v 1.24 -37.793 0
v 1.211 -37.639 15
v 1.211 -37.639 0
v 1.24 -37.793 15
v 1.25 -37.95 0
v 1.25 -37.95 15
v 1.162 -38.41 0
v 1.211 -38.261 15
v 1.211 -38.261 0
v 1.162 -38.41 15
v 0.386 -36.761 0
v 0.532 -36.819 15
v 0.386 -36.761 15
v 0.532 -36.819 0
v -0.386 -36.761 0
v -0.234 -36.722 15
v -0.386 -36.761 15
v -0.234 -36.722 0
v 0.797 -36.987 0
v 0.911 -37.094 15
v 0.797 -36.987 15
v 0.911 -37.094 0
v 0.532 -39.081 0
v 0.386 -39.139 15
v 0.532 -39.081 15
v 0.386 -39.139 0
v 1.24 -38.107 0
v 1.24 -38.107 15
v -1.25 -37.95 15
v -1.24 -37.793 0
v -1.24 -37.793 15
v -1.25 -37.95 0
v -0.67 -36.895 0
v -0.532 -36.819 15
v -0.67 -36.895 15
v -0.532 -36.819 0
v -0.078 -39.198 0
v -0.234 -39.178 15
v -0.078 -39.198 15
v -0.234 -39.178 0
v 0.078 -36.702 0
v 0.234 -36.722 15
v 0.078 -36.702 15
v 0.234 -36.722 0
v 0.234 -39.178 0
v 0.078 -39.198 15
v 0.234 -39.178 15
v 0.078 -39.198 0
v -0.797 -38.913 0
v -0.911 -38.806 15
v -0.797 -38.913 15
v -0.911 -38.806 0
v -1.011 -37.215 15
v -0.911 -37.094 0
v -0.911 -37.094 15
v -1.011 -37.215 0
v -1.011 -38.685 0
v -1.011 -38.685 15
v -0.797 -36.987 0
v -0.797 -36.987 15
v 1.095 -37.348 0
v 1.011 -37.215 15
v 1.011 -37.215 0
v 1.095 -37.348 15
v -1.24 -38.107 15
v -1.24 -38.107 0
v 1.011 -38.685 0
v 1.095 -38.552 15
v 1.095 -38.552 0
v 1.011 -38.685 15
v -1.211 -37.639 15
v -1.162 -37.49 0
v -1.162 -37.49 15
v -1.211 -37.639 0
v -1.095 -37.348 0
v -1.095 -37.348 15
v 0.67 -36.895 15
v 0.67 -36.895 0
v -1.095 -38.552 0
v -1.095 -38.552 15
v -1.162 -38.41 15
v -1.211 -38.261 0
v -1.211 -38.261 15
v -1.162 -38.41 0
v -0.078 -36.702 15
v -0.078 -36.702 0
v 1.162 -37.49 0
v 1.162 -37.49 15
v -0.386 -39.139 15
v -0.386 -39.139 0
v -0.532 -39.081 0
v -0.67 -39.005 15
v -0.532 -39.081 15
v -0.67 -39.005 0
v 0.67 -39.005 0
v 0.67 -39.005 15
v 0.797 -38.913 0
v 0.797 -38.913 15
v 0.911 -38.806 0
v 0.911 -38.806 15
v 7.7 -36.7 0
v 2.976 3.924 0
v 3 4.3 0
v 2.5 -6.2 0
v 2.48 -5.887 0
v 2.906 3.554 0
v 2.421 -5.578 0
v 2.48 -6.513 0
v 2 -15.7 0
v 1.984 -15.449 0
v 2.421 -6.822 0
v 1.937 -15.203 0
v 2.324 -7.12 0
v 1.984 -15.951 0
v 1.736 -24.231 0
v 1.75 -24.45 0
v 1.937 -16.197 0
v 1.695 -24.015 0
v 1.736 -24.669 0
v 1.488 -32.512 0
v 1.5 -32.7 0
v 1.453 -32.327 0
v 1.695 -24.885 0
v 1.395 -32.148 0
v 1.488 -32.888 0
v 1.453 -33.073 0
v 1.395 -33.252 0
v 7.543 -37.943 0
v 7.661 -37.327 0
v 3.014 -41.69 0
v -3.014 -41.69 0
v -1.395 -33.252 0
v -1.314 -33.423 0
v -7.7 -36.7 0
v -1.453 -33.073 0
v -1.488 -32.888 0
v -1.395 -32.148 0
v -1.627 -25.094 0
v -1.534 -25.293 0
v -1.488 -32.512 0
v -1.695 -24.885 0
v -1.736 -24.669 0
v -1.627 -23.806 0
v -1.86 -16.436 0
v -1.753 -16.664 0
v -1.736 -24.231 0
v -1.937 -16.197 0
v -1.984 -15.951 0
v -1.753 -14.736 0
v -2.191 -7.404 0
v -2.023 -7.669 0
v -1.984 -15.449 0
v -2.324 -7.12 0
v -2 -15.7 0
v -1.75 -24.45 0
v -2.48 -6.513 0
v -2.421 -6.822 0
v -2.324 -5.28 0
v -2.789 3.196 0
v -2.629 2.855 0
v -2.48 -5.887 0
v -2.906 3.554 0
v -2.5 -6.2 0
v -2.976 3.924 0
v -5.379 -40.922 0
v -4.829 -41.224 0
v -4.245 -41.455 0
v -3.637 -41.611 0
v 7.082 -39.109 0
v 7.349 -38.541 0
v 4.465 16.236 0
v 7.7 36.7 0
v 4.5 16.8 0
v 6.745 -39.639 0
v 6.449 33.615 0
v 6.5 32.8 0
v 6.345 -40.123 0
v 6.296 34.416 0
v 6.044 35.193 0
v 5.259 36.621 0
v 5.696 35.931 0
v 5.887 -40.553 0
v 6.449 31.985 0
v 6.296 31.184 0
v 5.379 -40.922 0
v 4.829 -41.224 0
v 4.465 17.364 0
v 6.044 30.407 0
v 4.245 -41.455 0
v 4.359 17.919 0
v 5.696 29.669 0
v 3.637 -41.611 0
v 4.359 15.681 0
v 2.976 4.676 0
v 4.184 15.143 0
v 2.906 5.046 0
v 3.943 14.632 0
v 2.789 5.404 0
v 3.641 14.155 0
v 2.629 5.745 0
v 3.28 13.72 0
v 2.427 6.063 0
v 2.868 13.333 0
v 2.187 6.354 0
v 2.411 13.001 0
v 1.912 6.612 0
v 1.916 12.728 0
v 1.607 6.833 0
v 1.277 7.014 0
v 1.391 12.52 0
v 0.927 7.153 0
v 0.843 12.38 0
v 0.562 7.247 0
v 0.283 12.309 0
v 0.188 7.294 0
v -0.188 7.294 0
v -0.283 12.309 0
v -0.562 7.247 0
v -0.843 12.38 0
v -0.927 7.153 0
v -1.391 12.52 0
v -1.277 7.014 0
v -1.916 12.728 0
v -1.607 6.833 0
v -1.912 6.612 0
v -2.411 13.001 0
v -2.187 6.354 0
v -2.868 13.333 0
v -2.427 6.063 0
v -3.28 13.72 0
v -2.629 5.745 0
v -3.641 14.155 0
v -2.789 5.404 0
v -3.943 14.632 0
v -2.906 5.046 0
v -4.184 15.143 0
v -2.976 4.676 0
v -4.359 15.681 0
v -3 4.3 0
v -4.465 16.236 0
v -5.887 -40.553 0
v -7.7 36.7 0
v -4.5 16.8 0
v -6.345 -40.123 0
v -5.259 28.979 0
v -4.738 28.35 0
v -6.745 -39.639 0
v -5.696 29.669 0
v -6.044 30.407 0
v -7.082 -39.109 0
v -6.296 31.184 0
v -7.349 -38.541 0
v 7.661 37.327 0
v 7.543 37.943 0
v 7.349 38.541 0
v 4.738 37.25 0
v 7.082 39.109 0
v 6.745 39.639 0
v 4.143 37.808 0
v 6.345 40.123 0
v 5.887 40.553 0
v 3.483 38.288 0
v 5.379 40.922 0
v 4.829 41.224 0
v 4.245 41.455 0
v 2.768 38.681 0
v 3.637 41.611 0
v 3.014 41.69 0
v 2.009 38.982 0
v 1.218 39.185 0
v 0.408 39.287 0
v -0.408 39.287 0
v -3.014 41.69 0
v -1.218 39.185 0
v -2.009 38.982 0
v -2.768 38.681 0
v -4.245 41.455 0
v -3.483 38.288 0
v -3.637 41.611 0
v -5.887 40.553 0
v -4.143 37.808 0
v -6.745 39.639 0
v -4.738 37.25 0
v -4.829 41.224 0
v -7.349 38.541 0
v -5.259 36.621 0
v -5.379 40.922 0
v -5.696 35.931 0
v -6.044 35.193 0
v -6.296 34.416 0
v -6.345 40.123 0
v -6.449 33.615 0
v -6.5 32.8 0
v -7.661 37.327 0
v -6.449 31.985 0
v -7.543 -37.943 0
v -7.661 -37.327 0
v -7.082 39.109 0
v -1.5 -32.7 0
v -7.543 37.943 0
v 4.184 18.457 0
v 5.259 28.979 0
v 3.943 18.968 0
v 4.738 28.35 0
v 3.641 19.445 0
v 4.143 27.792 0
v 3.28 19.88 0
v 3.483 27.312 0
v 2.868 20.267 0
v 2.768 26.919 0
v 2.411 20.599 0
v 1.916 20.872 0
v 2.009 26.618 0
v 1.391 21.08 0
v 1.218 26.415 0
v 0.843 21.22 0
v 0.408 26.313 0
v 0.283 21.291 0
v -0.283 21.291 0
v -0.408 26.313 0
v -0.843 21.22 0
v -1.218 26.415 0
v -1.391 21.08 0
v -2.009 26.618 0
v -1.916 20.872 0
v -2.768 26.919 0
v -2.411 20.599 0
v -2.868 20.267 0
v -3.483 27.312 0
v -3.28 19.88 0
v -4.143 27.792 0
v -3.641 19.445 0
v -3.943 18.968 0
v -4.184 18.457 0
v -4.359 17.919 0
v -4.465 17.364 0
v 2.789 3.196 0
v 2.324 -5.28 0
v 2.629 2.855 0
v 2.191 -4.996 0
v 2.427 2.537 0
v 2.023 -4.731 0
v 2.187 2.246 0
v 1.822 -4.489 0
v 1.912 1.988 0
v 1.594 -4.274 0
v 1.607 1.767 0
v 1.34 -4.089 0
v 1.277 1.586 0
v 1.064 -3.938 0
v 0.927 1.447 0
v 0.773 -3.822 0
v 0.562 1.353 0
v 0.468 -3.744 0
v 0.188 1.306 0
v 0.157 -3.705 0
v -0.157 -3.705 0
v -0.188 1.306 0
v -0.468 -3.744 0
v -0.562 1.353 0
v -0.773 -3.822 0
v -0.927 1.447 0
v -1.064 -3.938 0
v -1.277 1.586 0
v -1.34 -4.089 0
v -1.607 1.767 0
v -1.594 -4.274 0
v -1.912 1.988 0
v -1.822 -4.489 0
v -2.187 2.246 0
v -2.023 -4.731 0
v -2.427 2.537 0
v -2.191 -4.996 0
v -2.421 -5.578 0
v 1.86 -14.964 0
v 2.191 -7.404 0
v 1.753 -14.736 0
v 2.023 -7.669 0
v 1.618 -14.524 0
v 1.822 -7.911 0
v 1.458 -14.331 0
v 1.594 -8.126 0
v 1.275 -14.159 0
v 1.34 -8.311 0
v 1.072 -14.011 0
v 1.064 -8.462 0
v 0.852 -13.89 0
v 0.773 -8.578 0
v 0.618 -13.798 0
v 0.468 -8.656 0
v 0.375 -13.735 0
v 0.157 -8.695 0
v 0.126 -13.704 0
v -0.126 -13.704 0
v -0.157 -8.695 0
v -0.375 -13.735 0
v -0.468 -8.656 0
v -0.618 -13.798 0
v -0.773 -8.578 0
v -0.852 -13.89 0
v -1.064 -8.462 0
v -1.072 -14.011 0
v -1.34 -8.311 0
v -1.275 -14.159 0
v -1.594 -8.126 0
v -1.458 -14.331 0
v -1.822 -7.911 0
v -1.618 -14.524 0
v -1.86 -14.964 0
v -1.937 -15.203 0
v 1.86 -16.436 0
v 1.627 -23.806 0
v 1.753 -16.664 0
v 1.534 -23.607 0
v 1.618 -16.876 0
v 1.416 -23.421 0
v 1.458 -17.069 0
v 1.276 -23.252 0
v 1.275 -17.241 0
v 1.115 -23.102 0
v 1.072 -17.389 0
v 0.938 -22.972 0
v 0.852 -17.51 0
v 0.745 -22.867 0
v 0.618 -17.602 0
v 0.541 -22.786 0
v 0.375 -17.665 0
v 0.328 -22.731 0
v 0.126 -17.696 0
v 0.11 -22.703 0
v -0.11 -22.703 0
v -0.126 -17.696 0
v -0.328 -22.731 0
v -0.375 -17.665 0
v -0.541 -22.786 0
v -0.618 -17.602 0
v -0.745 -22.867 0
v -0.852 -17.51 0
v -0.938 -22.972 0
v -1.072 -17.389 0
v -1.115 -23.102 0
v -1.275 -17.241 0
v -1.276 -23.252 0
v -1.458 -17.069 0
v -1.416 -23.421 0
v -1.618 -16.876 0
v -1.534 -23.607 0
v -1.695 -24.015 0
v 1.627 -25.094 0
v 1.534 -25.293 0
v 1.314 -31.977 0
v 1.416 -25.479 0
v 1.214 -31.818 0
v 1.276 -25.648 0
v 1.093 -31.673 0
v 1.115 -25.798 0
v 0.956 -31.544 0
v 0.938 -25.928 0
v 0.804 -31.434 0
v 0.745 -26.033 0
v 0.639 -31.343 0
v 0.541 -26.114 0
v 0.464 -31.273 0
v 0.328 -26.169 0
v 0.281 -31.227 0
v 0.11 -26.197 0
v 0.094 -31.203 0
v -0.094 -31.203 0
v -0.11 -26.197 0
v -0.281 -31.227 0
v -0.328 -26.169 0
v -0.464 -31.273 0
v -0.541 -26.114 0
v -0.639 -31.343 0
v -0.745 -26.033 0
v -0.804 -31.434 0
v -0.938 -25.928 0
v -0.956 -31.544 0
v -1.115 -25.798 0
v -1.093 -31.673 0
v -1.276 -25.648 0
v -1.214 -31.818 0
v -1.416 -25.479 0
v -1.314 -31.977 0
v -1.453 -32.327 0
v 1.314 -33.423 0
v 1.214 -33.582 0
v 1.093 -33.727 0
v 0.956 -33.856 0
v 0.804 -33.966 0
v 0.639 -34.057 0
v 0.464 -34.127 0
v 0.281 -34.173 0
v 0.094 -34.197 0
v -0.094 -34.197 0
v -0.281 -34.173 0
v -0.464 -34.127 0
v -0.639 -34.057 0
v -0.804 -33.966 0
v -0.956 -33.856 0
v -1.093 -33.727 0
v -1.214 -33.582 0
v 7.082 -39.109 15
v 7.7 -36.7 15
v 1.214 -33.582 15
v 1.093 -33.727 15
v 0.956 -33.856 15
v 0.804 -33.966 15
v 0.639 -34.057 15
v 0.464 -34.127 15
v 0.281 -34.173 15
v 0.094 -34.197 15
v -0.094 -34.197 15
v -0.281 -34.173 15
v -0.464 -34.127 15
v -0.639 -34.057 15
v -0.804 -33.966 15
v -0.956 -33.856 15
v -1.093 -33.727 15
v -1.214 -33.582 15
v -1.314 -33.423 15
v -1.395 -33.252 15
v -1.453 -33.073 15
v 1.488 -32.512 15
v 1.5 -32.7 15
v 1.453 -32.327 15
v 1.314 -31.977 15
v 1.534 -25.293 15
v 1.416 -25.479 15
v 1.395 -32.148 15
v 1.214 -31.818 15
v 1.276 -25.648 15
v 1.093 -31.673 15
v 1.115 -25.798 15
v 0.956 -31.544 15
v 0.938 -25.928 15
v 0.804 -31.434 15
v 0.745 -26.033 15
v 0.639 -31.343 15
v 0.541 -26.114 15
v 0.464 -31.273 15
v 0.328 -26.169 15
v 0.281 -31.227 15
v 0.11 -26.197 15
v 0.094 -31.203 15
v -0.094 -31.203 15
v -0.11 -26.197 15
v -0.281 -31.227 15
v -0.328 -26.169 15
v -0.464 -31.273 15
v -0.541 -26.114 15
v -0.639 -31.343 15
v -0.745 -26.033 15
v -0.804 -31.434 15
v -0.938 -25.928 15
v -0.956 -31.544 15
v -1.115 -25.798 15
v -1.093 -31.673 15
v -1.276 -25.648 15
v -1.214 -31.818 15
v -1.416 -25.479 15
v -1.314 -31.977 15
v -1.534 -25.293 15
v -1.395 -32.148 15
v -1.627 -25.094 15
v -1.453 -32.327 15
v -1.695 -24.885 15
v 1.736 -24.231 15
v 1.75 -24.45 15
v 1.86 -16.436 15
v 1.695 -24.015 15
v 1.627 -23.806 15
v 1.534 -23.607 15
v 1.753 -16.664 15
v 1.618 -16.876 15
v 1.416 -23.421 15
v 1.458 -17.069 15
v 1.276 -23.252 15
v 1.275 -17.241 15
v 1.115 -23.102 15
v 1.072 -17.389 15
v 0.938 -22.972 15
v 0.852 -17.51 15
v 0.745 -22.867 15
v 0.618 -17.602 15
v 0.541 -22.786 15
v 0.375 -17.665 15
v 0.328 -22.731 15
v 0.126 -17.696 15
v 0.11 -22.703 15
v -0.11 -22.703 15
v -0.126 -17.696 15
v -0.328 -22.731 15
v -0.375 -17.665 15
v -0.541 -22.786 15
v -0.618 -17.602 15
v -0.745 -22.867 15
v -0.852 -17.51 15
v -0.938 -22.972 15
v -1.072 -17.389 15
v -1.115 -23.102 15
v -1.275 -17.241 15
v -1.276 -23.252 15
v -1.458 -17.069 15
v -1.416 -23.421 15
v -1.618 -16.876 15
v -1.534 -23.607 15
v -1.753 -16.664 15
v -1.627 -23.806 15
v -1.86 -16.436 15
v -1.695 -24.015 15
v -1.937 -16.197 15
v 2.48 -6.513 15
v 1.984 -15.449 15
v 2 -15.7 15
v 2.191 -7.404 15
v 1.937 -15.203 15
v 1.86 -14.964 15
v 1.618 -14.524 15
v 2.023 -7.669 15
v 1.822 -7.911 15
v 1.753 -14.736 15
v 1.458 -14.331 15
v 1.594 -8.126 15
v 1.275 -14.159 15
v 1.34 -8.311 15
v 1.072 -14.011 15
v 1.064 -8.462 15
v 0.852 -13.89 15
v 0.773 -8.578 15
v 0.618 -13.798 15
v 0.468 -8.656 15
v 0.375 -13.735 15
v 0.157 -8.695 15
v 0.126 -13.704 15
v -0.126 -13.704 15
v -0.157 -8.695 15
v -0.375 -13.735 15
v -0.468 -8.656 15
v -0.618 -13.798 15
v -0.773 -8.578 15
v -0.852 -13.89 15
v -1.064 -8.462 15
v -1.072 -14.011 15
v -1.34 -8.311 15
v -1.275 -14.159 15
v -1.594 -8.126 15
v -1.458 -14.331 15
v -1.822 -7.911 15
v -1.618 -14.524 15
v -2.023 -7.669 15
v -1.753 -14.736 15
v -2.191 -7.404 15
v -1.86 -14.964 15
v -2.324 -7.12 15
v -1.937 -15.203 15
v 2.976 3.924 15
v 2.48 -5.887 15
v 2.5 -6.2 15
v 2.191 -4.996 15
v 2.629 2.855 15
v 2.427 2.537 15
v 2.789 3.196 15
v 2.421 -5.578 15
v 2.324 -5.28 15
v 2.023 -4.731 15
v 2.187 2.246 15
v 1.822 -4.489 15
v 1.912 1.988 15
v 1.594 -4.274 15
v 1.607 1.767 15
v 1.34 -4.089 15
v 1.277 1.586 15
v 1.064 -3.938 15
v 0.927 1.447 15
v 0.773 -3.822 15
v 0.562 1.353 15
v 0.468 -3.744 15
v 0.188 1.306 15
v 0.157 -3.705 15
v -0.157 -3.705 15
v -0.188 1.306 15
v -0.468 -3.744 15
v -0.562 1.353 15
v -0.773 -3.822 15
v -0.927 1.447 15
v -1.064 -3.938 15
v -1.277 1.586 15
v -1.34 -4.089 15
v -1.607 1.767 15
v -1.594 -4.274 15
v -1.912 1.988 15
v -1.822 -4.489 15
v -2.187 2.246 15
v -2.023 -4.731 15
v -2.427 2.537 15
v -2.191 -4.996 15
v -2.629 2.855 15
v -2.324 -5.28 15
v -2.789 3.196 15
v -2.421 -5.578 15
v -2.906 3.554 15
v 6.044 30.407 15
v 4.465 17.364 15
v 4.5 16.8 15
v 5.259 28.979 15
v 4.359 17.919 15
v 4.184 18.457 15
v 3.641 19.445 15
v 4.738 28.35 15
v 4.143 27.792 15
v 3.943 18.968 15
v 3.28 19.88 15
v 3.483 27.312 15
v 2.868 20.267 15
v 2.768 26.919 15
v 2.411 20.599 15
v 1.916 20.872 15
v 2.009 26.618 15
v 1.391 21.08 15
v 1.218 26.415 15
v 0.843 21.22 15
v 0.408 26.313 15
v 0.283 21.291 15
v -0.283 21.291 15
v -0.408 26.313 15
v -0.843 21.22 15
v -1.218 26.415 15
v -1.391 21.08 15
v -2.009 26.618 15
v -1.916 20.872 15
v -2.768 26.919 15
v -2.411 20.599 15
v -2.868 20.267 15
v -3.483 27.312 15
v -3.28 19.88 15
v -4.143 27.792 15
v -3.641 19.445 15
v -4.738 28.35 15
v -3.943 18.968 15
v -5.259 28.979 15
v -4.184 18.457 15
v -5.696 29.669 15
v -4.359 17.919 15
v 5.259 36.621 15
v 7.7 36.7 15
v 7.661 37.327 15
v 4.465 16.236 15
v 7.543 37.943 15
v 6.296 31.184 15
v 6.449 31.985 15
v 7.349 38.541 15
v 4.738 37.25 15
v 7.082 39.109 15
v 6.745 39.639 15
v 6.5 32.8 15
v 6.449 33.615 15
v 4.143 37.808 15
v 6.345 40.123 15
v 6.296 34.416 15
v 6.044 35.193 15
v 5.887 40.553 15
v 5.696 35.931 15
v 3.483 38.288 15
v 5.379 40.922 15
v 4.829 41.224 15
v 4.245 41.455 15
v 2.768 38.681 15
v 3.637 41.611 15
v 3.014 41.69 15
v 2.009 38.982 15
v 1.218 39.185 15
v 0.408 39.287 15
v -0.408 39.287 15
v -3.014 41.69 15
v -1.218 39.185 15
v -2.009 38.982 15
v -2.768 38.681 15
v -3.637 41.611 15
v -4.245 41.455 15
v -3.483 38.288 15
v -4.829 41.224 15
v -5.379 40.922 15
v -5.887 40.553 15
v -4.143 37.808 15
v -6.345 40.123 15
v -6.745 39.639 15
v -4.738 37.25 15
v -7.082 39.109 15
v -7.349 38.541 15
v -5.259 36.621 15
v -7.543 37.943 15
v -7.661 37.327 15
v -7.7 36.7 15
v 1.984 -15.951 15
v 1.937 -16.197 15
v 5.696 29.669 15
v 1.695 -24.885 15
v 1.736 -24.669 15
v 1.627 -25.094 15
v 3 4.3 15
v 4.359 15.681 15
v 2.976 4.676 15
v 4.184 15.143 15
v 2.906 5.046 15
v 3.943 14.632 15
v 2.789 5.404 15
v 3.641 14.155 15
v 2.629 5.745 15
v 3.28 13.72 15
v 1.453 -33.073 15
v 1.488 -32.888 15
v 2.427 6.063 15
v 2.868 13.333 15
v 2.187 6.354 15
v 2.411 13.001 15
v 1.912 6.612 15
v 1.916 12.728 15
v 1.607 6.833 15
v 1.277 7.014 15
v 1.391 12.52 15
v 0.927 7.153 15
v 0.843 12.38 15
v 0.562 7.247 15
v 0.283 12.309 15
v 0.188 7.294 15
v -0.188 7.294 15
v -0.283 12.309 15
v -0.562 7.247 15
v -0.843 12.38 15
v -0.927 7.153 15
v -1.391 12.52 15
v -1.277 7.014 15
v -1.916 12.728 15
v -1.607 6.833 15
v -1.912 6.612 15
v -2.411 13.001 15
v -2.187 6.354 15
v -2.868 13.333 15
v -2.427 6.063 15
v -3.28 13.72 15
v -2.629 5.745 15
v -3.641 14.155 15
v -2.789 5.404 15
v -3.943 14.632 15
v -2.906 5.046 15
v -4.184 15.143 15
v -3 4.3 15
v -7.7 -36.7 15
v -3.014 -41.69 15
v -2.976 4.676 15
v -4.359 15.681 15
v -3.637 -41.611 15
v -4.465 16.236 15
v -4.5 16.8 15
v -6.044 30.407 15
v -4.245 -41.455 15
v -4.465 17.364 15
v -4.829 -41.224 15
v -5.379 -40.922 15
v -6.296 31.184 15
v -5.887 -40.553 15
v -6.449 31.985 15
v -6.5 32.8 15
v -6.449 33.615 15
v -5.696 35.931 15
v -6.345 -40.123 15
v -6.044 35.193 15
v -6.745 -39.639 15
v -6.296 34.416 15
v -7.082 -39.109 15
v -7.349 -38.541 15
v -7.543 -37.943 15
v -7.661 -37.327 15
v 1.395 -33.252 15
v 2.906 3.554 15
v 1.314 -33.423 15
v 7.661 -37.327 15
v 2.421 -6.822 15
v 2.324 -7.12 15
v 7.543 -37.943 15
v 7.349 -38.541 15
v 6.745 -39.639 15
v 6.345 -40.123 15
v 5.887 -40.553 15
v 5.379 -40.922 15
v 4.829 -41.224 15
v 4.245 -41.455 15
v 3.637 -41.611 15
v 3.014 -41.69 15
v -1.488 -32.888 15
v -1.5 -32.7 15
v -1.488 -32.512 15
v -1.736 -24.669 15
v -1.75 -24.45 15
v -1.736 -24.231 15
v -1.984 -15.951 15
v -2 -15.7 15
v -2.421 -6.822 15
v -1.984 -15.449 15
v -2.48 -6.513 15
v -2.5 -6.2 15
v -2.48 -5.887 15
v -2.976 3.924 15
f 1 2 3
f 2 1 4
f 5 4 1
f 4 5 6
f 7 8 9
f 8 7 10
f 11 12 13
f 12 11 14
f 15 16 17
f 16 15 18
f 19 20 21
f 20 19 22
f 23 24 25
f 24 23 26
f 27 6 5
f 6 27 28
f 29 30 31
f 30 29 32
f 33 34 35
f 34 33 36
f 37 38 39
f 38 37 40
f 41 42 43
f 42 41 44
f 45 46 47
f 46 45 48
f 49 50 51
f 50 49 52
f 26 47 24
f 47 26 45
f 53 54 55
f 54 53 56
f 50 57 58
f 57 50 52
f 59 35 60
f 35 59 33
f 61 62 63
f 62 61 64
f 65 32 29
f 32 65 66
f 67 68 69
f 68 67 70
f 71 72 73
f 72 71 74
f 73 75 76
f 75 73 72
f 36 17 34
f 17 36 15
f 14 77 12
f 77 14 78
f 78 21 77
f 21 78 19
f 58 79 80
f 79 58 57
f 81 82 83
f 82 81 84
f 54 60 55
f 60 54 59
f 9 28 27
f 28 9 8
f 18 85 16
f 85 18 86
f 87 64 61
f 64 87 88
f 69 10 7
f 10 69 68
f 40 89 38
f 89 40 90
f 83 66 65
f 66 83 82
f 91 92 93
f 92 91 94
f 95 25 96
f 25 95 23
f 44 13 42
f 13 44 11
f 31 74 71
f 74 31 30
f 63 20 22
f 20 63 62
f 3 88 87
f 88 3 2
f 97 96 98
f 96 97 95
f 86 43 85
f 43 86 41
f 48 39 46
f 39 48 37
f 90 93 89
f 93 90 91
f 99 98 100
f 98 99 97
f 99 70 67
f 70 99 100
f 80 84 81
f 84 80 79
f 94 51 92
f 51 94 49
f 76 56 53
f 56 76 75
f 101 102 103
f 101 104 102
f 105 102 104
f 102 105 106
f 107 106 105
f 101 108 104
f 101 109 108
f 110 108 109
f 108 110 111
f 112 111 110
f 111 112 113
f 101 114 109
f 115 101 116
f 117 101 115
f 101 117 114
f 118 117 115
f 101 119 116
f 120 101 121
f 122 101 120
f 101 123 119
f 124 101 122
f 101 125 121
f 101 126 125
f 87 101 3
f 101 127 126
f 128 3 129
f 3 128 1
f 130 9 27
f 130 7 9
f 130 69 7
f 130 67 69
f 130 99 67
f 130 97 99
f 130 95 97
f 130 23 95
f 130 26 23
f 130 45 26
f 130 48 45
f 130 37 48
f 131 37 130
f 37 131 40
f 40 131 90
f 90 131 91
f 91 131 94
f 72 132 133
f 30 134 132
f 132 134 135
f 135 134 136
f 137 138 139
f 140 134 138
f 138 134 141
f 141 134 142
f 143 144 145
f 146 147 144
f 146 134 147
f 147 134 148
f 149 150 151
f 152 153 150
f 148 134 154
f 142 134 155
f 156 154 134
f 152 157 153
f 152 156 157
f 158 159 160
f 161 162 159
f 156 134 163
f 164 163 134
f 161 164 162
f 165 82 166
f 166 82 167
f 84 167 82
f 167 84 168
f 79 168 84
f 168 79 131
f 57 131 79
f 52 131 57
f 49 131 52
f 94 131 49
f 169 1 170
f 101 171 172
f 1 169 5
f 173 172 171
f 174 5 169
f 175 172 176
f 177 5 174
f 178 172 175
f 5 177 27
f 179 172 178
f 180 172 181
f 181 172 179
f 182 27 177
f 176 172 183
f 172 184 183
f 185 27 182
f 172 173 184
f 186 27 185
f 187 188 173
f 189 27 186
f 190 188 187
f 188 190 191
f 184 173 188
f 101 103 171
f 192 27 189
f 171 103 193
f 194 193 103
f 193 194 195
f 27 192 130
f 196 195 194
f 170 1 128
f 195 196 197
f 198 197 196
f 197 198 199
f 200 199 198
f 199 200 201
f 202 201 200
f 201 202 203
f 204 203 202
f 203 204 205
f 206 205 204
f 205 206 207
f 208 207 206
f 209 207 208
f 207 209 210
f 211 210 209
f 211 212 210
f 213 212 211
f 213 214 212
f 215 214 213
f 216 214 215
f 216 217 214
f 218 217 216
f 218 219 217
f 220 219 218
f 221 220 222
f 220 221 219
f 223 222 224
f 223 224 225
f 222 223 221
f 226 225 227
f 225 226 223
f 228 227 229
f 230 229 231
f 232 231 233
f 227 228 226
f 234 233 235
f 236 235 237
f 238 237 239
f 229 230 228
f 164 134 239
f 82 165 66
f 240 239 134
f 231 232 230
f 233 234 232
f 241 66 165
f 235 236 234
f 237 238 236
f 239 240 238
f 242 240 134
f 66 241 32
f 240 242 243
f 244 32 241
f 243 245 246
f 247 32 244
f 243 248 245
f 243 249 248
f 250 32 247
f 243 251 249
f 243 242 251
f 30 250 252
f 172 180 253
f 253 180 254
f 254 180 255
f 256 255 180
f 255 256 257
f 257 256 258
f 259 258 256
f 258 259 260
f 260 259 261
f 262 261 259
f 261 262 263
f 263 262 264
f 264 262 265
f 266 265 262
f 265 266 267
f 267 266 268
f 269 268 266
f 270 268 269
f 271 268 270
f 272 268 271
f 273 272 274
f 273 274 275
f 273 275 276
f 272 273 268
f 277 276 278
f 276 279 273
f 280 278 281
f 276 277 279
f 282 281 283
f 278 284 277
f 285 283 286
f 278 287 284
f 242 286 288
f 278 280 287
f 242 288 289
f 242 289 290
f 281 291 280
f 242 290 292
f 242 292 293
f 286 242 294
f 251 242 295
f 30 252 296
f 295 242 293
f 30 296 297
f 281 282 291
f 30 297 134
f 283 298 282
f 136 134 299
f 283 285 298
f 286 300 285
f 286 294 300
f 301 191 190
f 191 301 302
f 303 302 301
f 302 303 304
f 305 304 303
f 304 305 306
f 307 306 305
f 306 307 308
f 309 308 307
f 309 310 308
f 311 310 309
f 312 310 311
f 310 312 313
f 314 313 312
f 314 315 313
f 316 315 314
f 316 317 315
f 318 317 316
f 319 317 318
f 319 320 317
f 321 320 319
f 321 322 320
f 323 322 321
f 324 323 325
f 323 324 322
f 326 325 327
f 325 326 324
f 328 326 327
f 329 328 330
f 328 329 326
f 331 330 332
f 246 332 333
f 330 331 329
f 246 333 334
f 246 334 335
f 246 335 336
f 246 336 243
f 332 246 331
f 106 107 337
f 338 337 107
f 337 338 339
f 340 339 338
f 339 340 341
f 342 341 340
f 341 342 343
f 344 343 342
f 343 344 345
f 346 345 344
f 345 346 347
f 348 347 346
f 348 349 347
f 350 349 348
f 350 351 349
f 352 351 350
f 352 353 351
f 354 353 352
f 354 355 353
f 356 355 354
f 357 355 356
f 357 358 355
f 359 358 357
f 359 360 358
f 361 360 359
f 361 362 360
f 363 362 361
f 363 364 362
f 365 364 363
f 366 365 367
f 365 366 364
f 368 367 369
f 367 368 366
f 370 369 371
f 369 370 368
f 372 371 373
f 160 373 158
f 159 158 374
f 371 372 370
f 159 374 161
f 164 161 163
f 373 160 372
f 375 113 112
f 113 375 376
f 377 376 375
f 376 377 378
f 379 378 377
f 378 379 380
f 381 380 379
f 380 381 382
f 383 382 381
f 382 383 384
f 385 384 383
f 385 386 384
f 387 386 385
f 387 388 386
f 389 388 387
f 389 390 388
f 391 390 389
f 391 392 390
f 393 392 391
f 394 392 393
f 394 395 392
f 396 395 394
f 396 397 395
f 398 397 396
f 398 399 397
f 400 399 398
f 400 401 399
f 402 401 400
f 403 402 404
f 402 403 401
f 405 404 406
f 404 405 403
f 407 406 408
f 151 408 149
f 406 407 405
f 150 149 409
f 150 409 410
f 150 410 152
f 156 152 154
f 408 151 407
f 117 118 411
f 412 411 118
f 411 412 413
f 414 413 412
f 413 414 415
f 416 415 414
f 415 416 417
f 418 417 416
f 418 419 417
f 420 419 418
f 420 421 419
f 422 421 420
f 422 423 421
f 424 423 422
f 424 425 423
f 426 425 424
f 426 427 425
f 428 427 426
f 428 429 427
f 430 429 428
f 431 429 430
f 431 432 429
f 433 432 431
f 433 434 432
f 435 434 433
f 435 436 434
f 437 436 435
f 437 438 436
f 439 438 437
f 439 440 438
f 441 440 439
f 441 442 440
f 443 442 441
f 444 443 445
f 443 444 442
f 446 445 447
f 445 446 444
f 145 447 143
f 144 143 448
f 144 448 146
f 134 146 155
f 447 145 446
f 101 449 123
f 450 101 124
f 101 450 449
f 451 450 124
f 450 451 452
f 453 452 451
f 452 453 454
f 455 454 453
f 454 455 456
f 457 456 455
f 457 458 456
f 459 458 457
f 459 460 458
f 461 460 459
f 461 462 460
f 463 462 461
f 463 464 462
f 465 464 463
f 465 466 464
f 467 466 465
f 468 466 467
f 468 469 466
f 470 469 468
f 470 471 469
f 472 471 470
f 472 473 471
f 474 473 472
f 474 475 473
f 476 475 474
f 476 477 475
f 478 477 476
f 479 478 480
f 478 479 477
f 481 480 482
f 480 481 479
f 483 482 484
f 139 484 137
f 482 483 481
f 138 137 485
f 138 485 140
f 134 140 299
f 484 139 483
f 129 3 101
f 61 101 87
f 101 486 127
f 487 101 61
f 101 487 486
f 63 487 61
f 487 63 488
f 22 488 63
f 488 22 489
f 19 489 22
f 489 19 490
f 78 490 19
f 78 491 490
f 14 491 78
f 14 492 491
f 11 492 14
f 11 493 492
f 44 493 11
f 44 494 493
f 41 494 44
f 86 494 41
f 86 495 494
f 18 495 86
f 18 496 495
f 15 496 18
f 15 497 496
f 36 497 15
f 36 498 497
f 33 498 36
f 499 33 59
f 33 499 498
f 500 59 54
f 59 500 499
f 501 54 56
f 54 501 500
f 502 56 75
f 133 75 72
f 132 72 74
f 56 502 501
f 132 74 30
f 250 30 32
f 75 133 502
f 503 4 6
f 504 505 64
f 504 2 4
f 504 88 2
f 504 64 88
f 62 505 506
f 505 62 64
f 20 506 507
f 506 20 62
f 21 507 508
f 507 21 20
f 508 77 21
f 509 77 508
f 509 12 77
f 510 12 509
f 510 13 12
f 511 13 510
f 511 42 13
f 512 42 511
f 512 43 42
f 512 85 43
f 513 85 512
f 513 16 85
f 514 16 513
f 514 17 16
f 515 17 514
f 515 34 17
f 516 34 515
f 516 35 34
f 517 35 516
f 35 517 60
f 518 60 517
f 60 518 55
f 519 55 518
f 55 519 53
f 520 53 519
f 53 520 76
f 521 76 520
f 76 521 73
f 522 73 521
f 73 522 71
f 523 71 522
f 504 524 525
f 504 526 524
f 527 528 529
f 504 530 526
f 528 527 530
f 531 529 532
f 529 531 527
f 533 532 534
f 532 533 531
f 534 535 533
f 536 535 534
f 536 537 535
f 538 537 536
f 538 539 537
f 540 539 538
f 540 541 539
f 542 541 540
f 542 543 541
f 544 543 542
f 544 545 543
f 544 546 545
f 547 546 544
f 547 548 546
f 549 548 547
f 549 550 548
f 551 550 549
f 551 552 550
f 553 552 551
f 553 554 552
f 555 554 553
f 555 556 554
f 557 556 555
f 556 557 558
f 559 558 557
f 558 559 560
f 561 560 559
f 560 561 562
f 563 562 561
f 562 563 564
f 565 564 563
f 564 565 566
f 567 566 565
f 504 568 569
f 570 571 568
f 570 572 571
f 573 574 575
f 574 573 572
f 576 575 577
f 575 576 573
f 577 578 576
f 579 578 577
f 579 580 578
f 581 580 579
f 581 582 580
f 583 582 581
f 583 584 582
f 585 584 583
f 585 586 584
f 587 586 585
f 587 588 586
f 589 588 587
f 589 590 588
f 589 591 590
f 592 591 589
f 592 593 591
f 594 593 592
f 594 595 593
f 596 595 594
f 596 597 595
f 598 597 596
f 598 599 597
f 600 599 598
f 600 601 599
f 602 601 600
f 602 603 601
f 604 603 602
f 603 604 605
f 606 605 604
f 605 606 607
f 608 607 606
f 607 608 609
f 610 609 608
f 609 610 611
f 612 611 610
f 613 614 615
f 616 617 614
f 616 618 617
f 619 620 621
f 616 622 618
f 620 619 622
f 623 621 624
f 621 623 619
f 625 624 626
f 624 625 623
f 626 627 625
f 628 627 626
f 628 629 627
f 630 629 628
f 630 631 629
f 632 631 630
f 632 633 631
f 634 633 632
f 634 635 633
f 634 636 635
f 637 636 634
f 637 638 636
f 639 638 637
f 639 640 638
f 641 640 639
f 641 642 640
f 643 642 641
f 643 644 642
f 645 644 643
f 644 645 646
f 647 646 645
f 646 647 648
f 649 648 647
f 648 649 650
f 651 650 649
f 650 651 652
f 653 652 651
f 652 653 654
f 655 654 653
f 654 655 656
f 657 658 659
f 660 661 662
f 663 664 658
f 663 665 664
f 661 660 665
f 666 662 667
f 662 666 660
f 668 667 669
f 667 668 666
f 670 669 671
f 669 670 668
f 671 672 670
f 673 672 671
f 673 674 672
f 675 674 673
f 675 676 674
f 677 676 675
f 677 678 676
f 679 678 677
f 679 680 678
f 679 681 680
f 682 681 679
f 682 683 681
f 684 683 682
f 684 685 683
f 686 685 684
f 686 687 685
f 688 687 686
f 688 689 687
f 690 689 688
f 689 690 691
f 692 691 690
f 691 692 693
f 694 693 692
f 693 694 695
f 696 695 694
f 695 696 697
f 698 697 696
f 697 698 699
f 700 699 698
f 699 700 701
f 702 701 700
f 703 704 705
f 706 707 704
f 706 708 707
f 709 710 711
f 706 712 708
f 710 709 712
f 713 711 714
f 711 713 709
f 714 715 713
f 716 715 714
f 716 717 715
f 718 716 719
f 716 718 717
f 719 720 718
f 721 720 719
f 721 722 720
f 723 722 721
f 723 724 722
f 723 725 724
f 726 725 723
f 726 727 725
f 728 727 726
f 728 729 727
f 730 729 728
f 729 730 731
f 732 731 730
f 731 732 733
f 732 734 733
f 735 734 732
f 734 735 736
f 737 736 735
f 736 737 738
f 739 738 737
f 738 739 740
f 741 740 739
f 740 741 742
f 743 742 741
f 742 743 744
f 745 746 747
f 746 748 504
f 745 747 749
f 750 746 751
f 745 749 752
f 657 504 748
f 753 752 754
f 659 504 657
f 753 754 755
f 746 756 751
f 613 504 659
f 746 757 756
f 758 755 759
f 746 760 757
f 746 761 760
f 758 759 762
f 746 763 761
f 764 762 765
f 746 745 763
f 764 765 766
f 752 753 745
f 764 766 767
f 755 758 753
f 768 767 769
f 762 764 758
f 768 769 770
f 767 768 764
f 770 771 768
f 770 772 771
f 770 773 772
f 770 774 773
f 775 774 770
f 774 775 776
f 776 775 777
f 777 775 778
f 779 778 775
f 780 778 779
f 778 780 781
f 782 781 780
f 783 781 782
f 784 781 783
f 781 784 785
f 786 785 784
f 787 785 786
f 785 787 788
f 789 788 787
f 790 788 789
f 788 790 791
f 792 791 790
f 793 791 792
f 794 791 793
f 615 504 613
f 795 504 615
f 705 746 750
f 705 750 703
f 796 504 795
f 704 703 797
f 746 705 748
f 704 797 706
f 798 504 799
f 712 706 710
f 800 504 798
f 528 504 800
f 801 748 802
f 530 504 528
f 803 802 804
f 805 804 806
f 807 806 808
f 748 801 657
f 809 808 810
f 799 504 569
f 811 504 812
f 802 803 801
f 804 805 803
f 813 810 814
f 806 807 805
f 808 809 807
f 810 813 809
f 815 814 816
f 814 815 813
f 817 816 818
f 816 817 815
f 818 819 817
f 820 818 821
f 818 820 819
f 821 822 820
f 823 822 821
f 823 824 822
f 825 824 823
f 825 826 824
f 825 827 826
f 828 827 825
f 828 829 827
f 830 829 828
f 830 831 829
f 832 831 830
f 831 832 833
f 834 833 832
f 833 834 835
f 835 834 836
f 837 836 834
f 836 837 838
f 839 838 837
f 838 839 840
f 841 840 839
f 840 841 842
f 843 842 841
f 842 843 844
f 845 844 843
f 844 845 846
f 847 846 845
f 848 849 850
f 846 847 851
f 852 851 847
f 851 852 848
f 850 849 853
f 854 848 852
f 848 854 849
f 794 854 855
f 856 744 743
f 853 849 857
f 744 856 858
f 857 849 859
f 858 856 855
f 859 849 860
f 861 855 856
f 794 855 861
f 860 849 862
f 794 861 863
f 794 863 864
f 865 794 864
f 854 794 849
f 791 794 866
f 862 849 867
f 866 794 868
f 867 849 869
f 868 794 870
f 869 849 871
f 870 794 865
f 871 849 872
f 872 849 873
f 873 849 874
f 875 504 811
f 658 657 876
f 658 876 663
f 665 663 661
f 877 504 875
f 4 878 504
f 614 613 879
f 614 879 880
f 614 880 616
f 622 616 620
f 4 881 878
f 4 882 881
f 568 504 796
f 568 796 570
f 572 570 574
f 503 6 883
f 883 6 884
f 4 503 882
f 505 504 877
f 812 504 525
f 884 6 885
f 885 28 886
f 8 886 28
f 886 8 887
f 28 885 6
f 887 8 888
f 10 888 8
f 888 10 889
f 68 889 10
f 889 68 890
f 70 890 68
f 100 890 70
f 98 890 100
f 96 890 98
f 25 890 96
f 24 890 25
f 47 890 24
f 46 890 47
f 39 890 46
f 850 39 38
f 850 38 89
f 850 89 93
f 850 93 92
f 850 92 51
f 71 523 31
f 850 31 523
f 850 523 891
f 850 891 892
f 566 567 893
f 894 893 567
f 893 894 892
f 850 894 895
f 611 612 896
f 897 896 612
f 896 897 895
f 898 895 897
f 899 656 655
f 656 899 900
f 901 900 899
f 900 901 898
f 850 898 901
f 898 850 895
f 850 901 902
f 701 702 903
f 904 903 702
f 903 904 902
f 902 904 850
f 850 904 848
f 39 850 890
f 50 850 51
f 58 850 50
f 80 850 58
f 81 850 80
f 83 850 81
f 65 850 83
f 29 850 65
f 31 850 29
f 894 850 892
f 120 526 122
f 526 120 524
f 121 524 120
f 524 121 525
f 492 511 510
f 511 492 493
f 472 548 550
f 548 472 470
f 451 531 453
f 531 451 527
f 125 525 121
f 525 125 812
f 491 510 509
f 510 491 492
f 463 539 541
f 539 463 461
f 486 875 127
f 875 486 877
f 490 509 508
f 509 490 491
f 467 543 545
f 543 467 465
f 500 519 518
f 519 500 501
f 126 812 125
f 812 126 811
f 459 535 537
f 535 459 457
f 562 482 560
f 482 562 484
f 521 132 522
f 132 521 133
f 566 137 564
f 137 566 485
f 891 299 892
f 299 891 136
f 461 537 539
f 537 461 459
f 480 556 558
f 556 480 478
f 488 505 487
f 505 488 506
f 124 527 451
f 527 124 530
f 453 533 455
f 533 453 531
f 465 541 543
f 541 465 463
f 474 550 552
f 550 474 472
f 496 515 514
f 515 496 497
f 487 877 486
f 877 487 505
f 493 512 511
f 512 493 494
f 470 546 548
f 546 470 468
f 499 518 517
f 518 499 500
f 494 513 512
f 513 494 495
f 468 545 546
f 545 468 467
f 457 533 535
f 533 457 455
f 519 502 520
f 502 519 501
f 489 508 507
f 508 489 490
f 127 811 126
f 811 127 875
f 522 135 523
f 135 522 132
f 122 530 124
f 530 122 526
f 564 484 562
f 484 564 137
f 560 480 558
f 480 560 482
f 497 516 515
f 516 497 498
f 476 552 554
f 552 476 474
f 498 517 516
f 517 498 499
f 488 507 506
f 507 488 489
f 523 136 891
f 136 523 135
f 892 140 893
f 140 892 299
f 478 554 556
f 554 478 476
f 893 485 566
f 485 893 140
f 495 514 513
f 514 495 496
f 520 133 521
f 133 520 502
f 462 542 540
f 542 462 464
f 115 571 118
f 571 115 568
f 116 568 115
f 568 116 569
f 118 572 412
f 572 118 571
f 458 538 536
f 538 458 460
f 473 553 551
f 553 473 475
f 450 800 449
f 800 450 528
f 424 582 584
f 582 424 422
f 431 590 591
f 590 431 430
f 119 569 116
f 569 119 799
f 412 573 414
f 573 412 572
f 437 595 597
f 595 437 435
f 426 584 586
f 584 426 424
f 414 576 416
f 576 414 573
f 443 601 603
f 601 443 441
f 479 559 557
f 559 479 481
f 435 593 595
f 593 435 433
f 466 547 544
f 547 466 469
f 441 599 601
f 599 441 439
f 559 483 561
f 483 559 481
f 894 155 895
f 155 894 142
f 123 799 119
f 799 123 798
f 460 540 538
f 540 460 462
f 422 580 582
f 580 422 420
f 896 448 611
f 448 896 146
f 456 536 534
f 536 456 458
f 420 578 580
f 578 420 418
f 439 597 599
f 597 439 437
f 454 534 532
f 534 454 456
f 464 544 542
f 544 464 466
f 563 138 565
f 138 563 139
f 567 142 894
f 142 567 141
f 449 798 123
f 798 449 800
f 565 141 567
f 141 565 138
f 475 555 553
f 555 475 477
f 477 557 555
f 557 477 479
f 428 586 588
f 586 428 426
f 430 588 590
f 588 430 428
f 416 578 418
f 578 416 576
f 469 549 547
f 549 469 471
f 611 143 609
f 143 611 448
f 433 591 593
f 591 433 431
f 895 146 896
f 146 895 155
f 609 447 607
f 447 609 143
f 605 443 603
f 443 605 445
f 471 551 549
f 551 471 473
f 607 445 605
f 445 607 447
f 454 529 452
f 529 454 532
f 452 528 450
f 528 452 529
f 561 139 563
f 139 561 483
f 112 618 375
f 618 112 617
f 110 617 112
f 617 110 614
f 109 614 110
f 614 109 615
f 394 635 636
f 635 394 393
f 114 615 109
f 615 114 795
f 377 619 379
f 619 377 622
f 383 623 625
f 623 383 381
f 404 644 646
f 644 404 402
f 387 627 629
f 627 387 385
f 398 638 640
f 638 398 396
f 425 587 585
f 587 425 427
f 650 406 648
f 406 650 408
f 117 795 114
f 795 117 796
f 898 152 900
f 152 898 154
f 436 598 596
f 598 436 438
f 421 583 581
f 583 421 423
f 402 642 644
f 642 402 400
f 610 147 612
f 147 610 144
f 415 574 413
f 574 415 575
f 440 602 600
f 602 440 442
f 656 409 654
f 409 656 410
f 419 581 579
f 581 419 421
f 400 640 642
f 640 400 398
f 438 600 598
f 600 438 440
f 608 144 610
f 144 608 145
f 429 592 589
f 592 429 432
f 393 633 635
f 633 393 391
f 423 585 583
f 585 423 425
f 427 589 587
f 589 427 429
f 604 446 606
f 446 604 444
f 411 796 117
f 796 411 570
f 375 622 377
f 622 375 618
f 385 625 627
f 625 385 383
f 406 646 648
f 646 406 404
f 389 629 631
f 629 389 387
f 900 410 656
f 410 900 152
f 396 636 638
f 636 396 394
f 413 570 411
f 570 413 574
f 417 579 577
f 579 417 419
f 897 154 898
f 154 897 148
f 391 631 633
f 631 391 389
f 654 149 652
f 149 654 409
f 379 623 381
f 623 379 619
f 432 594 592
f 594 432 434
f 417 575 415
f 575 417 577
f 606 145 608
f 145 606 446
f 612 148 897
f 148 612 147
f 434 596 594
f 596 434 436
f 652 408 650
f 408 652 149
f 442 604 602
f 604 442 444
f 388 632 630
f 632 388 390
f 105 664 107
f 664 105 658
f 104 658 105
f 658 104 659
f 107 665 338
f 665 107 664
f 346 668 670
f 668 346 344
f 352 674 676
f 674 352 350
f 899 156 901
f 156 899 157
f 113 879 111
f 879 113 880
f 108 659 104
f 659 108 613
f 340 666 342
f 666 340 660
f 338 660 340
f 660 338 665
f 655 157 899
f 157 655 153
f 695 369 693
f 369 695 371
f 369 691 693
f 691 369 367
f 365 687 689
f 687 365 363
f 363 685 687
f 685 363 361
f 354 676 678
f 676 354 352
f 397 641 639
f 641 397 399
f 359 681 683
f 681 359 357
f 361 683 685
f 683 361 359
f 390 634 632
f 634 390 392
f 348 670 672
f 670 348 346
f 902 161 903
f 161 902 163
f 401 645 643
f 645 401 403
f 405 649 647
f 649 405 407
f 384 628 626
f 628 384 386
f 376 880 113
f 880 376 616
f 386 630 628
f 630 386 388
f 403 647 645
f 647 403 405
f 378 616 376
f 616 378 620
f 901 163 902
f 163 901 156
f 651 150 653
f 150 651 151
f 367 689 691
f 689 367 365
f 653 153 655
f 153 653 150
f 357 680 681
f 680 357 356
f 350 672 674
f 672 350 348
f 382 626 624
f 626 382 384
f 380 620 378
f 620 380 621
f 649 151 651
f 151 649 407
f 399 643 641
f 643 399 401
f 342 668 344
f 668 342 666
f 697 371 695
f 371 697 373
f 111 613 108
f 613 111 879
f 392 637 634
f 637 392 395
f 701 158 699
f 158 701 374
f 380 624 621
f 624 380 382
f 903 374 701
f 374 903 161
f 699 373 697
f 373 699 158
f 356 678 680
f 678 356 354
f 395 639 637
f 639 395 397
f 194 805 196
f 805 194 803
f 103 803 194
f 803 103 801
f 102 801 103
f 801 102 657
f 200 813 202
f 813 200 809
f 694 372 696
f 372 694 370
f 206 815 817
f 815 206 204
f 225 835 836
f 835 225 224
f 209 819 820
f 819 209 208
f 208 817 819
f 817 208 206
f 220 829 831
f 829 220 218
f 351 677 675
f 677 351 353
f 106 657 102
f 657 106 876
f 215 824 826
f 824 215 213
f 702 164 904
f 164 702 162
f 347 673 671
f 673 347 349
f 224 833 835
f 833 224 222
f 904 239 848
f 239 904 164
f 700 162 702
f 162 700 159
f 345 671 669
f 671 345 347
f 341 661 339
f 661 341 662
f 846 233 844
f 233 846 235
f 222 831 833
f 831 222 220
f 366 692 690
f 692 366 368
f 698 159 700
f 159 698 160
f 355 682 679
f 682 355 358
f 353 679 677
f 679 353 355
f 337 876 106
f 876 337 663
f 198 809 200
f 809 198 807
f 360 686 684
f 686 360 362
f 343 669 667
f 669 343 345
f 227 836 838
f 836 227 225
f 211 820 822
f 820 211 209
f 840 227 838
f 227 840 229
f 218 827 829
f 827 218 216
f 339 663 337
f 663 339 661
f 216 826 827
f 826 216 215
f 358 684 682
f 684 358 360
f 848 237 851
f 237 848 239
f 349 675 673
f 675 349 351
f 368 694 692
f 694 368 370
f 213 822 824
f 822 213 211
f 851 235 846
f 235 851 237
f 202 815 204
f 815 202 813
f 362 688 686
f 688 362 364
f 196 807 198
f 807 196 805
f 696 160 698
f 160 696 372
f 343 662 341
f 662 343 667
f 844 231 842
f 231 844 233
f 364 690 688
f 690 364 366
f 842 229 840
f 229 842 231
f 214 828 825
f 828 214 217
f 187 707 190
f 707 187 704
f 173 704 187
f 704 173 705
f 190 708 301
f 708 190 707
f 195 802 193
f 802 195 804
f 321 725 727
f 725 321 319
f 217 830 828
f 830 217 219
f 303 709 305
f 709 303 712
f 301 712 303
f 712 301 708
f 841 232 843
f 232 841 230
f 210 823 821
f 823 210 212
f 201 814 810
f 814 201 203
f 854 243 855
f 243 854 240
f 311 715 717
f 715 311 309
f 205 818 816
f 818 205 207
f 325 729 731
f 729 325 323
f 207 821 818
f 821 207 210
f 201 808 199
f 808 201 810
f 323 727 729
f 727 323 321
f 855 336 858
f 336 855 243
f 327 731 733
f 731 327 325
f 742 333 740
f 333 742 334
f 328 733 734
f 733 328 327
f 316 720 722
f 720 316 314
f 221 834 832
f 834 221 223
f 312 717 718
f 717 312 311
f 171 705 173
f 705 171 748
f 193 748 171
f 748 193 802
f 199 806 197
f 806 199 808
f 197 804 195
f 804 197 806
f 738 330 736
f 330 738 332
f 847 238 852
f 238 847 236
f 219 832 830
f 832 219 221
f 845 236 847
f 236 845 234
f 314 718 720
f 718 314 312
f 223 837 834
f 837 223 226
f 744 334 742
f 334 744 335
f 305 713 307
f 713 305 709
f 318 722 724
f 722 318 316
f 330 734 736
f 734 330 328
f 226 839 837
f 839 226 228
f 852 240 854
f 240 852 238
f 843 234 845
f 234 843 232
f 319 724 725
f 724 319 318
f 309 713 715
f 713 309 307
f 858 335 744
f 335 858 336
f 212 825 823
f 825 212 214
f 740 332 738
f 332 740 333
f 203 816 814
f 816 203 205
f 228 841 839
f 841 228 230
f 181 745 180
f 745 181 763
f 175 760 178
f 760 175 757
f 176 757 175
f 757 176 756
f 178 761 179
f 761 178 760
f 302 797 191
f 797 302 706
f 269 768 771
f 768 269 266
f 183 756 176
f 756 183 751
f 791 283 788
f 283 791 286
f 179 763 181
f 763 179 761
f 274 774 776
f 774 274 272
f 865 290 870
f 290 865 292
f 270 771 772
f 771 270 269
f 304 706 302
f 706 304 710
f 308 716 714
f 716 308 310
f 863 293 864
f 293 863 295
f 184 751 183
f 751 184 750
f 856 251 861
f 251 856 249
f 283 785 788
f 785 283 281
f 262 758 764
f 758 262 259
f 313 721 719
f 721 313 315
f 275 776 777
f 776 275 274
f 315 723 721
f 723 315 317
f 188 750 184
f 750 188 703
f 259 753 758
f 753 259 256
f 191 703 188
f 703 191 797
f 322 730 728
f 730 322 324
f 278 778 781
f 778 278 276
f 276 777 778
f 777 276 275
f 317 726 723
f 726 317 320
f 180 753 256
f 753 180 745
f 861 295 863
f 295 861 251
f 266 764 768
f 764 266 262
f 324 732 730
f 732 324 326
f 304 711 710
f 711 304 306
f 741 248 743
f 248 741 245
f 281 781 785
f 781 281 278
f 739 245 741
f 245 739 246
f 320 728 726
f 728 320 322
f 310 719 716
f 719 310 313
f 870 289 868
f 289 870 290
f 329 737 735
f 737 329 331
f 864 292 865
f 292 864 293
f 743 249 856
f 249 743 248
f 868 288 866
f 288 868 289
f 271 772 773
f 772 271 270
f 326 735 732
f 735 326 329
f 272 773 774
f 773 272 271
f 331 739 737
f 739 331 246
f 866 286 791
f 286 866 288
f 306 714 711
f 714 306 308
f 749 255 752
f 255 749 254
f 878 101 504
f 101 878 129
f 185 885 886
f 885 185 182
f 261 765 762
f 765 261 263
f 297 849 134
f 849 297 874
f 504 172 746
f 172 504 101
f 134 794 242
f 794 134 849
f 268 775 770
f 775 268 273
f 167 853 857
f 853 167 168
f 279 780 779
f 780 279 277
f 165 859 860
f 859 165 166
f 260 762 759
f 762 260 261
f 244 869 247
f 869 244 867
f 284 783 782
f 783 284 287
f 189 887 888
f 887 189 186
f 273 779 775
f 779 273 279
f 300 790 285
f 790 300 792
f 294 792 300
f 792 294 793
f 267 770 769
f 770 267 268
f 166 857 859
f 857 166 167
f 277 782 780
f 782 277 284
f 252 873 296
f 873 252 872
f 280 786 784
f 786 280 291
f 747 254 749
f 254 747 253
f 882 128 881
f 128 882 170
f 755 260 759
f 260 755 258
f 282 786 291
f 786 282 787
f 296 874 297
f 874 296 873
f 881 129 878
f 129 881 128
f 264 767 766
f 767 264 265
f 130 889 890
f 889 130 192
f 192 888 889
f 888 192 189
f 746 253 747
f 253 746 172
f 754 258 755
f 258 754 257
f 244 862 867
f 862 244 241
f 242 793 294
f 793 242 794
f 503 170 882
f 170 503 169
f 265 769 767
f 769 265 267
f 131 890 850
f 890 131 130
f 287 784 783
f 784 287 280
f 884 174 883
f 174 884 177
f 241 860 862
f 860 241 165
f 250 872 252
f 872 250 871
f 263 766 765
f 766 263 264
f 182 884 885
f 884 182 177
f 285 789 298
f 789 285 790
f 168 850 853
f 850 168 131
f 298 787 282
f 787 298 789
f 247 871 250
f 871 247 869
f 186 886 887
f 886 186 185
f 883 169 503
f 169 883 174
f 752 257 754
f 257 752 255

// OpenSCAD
TOOL_SIZES = [2.5, 3, 3.5, 4, 5, 6, 9, 13];
SPACING = 5;
WALL_THICKNESS = 1.2;
CORNER_DIA = 10;
HEIGHT = 15;
WIDTH = max(TOOL_SIZES) + 2 * WALL_THICKNESS;
LENGTH = (len(TOOL_SIZES) - 1) * SPACING + sum(TOOL_SIZES, len(TOOL_SIZES)) + 2 * WALL_THICKNESS;

$fn = 50;

function sum(list, length, i = 0) =
  i < length - 1 ? list[i] + sum(list, length, i + 1) : list[i];

module rounded_rect(width, length, height, corner_dia) {
    hull() {
        for(i = [-1, 1]) {
            for(j = [-1, 1]) {
                translate([i * (width-corner_dia)/2, j * (length-corner_dia)/2, 0])
                cylinder(d = corner_dia, h = height);
            }
        }
    }
}


difference() {
    rounded_rect(WIDTH, LENGTH, HEIGHT, CORNER_DIA);

    for(i = [0:len(TOOL_SIZES)-1]) {
        translate([0, -LENGTH/2 + i * SPACING + sum(TOOL_SIZES, i) + TOOL_SIZES[i]/2, 0])
        cylinder(d = TOOL_SIZES[i], h = HEIGHT);
    }
}
